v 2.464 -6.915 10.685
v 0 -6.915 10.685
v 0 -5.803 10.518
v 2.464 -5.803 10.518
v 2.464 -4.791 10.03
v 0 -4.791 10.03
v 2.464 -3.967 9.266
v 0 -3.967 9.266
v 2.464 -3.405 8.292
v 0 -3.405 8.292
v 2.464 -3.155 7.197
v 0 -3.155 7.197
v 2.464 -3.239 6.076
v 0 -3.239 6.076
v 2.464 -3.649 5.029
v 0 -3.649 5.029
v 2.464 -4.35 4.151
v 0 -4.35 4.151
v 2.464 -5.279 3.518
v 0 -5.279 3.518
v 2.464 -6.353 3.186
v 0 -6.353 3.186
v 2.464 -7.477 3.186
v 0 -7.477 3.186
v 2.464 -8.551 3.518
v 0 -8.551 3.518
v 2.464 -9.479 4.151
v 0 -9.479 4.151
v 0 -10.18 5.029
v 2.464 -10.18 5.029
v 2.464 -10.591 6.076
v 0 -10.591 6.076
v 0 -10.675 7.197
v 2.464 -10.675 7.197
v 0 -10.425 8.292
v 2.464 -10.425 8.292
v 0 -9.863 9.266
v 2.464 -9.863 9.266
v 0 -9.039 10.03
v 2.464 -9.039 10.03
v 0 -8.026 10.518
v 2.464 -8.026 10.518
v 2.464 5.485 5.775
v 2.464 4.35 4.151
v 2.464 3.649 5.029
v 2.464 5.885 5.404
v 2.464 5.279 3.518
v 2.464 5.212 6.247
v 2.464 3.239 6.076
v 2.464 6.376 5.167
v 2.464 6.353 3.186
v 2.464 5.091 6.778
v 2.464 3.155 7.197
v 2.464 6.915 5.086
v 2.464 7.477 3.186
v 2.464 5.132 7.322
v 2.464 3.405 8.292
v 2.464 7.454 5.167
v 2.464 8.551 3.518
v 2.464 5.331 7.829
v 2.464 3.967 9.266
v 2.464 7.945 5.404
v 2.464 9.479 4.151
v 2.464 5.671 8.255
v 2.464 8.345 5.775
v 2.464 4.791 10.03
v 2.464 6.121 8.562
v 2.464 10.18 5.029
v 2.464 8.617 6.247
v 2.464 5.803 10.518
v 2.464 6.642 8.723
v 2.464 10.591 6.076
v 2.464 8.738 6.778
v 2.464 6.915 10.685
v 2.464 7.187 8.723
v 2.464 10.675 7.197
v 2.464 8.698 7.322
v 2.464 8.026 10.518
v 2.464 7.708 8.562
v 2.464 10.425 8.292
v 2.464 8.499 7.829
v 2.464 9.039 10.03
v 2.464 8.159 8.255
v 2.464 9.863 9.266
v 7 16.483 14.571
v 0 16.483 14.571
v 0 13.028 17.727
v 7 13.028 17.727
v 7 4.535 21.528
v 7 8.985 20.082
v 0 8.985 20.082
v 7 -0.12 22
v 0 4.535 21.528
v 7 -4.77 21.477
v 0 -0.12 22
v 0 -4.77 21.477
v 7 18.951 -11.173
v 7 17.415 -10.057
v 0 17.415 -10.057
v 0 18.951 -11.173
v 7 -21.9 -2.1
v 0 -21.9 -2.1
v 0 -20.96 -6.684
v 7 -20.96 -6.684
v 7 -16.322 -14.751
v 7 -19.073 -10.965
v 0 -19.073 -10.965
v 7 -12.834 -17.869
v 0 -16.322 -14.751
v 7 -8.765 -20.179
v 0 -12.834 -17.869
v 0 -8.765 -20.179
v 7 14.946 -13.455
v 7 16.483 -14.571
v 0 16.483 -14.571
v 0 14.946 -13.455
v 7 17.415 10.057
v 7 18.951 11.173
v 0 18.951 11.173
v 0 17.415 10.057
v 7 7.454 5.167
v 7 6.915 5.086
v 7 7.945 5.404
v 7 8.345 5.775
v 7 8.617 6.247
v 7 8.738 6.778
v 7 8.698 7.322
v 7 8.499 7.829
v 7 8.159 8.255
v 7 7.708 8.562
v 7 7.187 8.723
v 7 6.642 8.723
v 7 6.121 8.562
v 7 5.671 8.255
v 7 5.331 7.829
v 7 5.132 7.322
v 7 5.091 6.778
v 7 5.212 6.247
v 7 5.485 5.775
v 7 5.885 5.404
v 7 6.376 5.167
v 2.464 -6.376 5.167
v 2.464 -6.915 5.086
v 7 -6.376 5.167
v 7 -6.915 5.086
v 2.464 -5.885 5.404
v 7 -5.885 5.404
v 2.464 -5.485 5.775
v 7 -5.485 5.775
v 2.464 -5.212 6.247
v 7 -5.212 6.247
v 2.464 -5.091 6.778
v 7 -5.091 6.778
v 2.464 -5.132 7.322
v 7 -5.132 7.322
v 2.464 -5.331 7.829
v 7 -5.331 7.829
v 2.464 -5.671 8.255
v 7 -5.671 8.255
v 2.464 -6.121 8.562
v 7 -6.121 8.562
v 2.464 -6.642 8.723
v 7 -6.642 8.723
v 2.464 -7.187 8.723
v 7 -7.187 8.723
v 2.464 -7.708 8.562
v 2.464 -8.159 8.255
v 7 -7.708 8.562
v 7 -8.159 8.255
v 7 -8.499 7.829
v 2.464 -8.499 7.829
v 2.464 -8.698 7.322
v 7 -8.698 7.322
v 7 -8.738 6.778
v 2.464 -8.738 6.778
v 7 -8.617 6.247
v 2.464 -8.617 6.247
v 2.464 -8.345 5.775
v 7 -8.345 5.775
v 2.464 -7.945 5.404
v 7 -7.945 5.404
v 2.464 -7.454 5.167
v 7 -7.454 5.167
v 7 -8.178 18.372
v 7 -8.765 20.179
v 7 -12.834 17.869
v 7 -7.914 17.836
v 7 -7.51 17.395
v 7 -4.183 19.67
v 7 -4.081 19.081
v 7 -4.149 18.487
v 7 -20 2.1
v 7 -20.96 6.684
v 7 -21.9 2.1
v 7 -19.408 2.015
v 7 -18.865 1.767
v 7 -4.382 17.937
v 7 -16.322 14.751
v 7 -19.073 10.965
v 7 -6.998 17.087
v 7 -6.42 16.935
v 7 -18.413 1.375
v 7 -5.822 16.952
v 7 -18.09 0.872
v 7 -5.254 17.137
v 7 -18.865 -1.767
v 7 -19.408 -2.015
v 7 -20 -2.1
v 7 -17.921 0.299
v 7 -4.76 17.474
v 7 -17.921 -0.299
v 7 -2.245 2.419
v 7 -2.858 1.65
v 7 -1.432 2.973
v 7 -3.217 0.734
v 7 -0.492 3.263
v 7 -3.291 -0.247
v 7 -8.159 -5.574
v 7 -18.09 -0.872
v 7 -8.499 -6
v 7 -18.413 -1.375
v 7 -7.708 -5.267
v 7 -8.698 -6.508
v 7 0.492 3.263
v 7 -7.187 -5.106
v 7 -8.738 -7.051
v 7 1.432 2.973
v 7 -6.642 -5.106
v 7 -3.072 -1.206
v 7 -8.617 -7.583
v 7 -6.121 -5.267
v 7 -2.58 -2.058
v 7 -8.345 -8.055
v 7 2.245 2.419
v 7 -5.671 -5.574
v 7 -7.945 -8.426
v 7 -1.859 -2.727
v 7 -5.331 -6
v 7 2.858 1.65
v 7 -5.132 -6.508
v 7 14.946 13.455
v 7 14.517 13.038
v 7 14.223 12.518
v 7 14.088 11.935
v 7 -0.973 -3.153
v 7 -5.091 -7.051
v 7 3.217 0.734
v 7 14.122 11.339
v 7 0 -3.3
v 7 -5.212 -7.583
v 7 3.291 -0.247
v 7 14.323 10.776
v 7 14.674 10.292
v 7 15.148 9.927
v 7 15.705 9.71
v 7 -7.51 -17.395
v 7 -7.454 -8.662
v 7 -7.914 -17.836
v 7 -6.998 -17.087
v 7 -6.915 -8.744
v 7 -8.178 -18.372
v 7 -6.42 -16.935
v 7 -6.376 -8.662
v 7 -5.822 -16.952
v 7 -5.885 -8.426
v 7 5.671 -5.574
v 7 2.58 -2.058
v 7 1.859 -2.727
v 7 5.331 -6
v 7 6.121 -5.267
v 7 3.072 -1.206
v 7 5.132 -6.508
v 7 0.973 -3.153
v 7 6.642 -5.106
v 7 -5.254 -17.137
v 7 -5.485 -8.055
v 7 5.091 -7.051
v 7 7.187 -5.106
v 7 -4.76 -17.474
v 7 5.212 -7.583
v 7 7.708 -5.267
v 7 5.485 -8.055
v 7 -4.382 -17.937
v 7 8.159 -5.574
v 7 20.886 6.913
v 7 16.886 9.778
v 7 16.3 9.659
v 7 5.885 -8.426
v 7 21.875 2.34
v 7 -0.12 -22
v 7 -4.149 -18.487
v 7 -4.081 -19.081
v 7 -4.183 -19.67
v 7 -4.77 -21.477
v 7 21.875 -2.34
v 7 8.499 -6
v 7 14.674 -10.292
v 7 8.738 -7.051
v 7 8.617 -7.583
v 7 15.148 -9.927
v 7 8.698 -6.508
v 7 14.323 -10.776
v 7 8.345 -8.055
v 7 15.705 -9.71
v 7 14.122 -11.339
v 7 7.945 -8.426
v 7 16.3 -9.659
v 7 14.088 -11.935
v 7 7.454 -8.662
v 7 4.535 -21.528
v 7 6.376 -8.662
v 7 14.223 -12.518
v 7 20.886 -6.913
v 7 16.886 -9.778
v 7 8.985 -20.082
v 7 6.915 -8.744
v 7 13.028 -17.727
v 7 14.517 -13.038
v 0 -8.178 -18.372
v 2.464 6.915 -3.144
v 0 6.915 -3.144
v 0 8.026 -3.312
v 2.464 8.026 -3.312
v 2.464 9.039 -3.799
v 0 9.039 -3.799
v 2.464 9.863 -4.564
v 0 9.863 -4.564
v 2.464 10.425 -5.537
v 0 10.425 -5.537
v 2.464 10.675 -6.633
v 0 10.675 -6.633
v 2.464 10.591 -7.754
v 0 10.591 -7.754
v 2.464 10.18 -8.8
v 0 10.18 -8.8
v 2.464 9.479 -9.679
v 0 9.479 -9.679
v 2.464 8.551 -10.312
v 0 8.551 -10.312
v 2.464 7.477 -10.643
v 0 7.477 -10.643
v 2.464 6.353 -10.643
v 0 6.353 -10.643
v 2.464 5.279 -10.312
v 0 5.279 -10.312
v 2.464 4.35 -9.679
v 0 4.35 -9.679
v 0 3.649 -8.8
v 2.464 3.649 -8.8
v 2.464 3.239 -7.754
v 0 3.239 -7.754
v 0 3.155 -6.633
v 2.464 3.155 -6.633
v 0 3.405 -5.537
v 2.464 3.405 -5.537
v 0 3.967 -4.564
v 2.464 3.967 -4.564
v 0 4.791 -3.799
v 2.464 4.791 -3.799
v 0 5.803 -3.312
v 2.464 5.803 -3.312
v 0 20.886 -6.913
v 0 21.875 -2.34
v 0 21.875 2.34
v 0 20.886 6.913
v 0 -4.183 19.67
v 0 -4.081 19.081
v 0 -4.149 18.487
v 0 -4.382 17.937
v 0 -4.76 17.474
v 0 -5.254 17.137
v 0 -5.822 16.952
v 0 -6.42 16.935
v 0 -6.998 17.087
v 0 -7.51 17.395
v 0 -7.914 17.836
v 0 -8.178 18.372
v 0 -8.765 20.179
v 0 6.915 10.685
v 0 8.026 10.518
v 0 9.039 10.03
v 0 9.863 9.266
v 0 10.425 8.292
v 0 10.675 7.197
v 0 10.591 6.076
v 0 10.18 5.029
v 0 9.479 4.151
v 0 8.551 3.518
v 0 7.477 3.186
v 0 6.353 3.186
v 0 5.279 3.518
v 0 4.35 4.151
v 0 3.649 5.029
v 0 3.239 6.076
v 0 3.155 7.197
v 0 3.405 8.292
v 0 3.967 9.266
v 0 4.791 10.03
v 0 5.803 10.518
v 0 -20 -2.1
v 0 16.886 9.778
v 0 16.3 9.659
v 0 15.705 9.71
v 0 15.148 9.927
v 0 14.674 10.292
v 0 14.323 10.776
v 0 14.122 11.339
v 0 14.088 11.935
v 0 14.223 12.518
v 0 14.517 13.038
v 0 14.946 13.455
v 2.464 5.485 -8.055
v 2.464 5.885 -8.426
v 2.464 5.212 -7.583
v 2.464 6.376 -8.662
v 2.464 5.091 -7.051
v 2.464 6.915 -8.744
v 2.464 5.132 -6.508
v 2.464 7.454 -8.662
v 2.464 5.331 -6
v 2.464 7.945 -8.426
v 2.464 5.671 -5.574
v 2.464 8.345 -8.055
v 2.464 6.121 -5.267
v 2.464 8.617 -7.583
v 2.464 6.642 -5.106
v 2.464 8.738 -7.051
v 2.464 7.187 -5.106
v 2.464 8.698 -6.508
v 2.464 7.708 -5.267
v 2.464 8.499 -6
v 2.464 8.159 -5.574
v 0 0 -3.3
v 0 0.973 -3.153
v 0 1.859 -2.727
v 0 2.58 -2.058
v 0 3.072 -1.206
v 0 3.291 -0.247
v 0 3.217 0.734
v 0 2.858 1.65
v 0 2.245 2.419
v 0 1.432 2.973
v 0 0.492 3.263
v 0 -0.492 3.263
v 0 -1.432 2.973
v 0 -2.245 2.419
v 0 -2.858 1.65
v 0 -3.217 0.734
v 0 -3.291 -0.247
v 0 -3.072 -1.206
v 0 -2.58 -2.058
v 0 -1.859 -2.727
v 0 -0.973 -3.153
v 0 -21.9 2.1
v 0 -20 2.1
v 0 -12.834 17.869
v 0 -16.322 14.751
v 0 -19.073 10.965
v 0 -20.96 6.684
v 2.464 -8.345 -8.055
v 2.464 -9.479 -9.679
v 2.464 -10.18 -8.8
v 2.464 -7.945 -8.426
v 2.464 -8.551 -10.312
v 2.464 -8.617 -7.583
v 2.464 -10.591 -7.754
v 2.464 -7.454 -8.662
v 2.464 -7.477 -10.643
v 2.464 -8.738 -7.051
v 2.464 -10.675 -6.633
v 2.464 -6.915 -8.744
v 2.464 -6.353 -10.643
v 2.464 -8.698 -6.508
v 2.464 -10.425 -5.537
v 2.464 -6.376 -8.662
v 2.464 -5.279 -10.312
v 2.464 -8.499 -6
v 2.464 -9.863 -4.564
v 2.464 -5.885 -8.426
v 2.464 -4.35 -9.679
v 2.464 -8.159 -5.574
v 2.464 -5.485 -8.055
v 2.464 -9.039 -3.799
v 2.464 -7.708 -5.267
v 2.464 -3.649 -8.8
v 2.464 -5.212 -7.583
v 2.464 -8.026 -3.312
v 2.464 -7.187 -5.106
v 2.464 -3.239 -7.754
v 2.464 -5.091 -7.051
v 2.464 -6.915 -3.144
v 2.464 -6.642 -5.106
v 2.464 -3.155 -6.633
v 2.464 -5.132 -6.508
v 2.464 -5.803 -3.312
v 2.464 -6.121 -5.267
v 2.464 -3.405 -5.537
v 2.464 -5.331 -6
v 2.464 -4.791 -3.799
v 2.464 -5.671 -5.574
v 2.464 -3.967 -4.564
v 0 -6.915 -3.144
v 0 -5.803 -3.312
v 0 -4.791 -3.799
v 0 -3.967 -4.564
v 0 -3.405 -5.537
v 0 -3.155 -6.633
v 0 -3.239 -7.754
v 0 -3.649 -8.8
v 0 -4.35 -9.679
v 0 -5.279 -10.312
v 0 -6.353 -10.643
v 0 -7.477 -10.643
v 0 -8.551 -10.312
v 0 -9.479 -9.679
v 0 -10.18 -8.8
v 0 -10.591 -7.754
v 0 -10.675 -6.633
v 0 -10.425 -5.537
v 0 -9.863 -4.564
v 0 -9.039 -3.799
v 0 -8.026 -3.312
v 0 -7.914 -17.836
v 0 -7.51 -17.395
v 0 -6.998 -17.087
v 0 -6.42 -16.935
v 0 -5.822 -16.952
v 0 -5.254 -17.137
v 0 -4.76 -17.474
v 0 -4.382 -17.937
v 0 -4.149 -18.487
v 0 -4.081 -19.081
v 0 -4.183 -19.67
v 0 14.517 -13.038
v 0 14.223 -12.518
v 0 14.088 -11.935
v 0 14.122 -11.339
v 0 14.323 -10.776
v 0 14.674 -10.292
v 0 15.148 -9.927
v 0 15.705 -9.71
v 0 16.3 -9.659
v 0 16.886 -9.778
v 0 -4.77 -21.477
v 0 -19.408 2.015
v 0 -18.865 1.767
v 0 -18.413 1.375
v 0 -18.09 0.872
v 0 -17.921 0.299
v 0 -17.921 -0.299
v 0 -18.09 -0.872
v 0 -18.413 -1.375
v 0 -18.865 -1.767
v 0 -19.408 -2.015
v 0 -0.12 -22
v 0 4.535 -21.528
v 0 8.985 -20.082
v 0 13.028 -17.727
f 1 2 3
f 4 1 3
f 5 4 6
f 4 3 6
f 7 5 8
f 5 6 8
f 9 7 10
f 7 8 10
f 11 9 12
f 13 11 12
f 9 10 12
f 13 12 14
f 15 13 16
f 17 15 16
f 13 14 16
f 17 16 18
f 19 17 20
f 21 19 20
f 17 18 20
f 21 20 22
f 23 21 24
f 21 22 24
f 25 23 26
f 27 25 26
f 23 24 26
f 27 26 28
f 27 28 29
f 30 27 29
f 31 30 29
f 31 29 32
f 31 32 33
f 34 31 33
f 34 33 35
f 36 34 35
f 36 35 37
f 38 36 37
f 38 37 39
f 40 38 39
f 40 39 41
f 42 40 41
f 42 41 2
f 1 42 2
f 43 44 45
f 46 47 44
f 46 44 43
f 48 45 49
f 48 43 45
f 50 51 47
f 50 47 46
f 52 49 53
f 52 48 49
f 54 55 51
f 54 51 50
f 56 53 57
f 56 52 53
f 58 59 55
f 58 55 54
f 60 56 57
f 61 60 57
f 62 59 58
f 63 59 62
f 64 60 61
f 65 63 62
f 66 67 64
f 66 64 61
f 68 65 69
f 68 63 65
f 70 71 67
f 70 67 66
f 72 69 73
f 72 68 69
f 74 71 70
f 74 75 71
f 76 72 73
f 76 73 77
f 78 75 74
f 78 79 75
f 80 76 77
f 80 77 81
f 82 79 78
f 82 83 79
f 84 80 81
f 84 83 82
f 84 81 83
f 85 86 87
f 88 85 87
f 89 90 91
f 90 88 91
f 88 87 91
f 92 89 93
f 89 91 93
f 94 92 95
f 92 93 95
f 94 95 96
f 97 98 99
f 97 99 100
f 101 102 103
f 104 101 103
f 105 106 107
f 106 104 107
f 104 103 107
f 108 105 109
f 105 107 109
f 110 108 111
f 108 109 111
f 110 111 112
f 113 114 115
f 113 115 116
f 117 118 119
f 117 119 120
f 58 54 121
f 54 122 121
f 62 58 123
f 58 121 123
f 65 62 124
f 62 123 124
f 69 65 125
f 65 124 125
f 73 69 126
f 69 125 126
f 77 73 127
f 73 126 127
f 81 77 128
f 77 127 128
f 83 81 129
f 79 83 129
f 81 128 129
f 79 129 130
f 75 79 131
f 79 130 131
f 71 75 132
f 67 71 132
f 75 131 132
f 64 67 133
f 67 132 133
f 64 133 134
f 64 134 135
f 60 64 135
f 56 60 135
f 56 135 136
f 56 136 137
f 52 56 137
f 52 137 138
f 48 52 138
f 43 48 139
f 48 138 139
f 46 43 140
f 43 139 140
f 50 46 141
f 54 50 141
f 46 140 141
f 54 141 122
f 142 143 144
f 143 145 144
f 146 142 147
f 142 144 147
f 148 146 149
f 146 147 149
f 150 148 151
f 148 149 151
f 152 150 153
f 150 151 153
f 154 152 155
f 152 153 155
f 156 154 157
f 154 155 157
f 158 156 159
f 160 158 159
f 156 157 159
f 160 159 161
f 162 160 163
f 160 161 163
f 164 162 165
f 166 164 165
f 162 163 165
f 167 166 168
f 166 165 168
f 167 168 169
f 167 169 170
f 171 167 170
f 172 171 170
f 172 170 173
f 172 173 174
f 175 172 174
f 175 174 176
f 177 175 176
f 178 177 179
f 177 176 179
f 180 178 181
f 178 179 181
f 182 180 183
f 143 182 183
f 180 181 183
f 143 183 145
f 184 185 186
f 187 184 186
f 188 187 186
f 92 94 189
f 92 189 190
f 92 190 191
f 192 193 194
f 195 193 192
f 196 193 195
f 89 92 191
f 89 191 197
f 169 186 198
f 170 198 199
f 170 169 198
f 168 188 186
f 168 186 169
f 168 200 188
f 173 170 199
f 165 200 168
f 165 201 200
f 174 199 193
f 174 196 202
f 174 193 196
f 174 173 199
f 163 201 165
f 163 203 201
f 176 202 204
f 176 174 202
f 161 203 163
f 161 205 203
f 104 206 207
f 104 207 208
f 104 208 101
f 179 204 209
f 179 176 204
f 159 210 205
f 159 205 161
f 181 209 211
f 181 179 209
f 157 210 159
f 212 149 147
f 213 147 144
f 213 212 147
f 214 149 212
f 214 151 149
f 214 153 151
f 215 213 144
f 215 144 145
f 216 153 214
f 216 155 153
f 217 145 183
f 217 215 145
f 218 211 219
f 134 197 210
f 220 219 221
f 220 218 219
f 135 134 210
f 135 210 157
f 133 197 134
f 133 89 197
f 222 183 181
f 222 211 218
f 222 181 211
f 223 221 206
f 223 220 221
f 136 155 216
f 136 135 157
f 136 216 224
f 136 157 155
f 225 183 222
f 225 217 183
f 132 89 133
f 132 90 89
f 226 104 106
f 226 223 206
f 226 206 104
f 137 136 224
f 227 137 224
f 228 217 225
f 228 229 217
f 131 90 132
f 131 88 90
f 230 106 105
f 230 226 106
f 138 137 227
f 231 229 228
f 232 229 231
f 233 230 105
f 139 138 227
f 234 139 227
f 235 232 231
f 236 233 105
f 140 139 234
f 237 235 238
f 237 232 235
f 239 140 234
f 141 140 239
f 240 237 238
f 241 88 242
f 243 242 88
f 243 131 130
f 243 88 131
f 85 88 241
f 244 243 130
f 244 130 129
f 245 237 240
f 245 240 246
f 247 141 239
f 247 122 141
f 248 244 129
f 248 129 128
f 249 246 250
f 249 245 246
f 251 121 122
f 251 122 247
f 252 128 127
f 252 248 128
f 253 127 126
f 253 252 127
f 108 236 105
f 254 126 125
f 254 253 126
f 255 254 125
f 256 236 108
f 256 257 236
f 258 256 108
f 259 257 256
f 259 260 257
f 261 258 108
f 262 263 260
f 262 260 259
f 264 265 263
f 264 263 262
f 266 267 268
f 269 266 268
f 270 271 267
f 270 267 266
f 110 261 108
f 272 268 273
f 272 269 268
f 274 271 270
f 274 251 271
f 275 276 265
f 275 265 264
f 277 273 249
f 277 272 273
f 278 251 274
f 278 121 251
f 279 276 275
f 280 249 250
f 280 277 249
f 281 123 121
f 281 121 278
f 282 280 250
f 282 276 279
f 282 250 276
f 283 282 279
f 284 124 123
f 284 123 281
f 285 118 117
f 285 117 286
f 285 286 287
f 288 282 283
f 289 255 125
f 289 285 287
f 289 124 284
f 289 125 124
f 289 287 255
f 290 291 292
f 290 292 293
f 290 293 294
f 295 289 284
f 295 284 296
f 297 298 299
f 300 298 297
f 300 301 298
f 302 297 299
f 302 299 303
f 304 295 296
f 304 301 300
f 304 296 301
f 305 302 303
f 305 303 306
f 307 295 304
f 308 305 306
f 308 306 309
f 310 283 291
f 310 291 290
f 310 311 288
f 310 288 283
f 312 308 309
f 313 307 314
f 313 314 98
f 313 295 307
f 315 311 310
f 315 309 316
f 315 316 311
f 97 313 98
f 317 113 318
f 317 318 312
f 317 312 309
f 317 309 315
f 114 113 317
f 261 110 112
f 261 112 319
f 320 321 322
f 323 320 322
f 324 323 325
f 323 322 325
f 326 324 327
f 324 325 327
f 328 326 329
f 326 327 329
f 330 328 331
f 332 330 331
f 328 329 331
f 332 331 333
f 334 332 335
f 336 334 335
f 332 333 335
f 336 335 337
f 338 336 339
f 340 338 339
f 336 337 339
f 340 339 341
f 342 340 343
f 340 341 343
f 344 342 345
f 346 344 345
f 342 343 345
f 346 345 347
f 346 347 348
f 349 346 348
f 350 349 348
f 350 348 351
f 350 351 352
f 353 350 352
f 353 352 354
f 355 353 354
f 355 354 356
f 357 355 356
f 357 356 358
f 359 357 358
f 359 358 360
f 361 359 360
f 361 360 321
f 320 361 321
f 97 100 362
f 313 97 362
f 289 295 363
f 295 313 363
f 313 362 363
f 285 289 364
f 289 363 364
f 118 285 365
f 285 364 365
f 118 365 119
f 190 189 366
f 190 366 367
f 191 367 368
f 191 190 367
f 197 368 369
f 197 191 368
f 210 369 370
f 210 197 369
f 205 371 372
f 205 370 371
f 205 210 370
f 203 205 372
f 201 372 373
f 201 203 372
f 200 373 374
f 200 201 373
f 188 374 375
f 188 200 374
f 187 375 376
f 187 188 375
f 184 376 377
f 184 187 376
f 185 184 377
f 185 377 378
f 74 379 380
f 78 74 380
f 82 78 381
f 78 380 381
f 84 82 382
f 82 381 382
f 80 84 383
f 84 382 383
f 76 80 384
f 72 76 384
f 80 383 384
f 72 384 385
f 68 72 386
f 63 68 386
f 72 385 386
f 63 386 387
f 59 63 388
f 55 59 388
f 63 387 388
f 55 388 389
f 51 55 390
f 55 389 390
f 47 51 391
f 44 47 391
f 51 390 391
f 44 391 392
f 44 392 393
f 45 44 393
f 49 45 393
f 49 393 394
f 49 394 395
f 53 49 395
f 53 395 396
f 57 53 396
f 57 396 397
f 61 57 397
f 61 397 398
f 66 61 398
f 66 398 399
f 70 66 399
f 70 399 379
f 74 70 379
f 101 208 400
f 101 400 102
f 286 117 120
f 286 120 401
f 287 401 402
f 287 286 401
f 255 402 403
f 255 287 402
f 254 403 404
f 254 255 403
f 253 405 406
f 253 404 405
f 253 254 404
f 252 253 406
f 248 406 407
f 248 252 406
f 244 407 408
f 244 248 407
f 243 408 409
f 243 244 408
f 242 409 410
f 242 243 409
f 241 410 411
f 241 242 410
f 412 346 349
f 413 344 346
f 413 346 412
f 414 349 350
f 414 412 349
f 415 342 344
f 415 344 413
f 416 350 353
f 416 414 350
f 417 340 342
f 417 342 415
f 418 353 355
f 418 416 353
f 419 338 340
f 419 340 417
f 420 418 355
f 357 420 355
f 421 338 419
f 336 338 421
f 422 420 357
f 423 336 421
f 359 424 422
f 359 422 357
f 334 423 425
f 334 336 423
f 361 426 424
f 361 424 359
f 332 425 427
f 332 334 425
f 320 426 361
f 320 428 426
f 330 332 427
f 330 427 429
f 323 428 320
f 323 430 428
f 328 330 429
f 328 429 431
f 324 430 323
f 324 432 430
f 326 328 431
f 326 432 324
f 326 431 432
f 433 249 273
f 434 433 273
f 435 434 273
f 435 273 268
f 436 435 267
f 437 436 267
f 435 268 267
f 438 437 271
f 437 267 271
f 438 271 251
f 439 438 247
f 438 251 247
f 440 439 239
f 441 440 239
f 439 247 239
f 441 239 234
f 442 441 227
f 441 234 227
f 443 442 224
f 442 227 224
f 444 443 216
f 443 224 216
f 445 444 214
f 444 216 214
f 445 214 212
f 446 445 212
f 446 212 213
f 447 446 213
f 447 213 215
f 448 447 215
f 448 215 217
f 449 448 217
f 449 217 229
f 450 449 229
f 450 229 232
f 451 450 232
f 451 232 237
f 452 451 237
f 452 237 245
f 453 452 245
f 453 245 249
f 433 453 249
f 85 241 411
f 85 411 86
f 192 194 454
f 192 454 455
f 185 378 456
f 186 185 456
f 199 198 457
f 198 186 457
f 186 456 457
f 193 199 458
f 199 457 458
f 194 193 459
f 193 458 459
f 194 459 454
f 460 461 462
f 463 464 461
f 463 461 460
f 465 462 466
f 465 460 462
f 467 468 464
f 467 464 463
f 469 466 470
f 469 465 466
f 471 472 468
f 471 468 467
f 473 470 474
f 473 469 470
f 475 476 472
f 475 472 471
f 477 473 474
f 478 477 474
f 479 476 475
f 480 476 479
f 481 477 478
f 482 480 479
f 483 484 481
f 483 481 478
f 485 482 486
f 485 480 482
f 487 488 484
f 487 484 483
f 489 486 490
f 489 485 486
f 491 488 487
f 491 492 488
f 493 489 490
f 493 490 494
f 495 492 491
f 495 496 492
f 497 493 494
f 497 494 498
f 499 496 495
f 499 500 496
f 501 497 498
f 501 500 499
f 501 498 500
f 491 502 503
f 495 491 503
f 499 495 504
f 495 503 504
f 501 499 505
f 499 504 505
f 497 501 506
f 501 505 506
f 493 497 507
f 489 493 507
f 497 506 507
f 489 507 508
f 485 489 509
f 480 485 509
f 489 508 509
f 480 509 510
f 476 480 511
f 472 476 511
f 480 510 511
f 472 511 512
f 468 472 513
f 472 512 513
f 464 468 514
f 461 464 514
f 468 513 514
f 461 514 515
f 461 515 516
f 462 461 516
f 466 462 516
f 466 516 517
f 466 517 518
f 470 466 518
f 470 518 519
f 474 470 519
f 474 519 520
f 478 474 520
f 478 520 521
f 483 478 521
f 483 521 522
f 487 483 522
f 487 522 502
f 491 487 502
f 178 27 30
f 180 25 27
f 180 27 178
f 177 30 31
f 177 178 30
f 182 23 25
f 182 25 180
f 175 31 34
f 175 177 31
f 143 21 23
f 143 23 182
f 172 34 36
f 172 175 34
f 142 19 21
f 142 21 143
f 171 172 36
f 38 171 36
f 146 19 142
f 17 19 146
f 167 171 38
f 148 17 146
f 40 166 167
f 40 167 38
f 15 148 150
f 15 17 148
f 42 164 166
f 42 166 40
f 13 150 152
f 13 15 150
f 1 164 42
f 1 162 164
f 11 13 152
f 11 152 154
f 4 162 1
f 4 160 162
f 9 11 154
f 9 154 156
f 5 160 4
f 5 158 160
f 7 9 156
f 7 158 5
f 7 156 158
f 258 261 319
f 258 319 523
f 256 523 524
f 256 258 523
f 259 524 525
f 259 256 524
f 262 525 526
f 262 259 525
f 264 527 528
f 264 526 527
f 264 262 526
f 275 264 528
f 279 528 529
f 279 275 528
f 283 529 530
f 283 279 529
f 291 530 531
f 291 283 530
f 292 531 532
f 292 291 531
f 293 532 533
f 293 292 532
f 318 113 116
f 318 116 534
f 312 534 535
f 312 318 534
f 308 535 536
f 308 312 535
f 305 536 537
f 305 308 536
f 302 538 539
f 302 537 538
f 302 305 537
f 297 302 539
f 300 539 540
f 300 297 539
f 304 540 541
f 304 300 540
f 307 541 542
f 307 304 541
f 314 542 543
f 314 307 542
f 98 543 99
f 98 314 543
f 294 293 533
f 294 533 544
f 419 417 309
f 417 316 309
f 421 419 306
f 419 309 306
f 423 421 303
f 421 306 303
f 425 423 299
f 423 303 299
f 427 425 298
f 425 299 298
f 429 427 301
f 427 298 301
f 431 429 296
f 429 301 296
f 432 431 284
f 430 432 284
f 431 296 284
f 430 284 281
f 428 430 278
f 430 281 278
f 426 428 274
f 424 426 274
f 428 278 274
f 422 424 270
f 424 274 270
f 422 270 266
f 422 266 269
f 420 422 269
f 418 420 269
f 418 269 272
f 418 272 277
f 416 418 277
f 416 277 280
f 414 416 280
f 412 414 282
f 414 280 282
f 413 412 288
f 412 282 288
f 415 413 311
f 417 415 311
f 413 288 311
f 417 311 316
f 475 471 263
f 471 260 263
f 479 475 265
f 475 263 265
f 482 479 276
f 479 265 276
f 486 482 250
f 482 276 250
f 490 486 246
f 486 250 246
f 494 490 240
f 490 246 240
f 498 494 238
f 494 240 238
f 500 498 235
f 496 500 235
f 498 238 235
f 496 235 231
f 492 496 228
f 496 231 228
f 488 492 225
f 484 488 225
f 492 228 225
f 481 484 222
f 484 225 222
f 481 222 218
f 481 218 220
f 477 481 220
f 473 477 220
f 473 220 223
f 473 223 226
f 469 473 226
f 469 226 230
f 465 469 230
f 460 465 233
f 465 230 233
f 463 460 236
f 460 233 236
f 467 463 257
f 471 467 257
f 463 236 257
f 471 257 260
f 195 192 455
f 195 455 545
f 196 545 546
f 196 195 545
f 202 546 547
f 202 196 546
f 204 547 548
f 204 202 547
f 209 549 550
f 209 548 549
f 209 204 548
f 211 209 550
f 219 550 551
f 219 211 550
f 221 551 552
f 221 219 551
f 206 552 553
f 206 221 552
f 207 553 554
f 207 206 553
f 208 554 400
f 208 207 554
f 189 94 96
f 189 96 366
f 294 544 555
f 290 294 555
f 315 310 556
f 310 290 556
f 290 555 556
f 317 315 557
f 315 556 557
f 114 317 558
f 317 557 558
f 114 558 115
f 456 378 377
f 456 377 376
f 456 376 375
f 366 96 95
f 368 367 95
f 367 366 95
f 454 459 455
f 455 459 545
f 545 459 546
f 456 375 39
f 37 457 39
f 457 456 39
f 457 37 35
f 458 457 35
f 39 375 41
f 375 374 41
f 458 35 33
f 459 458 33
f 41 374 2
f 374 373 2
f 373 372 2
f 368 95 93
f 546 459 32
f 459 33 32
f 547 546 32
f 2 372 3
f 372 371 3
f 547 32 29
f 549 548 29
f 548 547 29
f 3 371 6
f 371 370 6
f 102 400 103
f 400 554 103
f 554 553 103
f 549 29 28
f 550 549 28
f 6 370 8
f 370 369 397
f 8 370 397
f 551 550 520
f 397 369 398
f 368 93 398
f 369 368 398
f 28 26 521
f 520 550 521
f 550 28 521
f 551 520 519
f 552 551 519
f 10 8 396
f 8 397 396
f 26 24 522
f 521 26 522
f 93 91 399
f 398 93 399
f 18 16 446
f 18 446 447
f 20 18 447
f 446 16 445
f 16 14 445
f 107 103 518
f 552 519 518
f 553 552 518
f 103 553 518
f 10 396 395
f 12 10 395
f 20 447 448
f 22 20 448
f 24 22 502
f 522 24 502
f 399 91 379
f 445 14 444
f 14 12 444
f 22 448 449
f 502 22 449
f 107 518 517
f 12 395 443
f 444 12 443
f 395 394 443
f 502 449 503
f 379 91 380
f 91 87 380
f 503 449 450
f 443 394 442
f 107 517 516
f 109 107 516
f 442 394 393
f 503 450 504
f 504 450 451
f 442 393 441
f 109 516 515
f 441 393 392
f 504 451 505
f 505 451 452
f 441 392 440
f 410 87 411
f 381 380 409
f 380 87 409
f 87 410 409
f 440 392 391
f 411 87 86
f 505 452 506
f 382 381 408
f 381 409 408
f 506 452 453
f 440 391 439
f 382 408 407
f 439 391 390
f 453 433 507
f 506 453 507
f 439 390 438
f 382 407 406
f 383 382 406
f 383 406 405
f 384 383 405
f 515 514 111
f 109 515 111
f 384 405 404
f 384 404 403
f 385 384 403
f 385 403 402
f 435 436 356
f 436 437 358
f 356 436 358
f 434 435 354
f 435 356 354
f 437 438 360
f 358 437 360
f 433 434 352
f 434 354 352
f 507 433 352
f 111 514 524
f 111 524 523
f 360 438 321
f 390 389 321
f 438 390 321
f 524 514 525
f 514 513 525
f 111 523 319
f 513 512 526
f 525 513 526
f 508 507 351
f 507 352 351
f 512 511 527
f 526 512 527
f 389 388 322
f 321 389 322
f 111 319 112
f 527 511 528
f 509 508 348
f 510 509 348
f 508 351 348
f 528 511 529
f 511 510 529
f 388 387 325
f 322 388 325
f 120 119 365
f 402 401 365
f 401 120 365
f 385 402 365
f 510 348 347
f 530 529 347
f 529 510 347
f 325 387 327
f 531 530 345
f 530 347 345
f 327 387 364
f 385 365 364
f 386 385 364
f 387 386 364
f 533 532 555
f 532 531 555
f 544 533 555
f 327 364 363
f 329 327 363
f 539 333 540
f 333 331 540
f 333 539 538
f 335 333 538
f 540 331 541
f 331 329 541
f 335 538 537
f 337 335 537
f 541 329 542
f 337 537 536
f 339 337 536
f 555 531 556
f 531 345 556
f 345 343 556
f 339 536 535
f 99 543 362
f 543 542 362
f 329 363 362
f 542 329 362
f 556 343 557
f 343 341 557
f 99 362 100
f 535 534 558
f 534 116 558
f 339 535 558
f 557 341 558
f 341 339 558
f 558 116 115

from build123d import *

# Parameters (mm, degrees)
ESQUISSE1_R                                      = 22
BOSS_EXTRU_1_DEPTH                               = 7
ENL_V_MAT_EXTRU_1_REACH                          = 33.89
R_P_TITION_CIRCULAIRE1_COUNT                     = 5
ENL_V_MAT_EXTRU_2_REACH                          = 33.89
ESQUISSE6_R                                      = 3.3
CHAMBRAGE_POUR_VIS_T_TE_RONDE_BOMB_E_D           = 3.6576
CHAMBRAGE_POUR_VIS_T_TE_RONDE_BOMB_E_CBORE_D     = 7.54126
CHAMBRAGE_POUR_VIS_T_TE_RONDE_BOMB_E_CBORE_DEPTH = 2.4638


with BuildPart() as part:
    # Esquisse1 → Boss.-Extru.1 (new body)
    with BuildSketch(Plane(origin=(0, 0, 0), x_dir=(0, 0, -1), z_dir=(1, 0, 0))):
        Circle(ESQUISSE1_R)
    extrude(amount=BOSS_EXTRU_1_DEPTH)

    # Esquisse5 → Enlèv. mat.-Extru.1 (cut, up to next)
    with BuildSketch(Plane(origin=(7, 0, 0), x_dir=(0, 0, -1), z_dir=(1, 0, 0)), mode=Mode.PRIVATE) as enl_v_mat_extru_1_sk1:
        with BuildLine():
            Line((2.1, -20), (2.1, -24))
            ThreePointArc((2.1, -24), (0, -26.1), (-2.1, -24))
            Line((-2.1, -24), (-2.1, -20))
            ThreePointArc((-2.1, -20), (0, -17.9), (2.1, -20))
        make_face()
    enl_v_mat_extru_1_tool1 = extrude(enl_v_mat_extru_1_sk1.sketch, amount=-ENL_V_MAT_EXTRU_1_REACH, mode=Mode.PRIVATE) & part.part
    enl_v_mat_extru_1 = enl_v_mat_extru_1_tool1.solids().sort_by_distance((7, -22, 0))[0]
    add(enl_v_mat_extru_1, mode=Mode.SUBTRACT)

    # Répétition circulaire1: Enlèv. mat.-Extru.1 ×5 about axis
    r_p_tition_circulaire1_axis = Axis((0, 0, 0), (1, 0, 0))
    for i in range(1, R_P_TITION_CIRCULAIRE1_COUNT):
        add(enl_v_mat_extru_1.rotate(r_p_tition_circulaire1_axis, i * 360 / R_P_TITION_CIRCULAIRE1_COUNT), mode=Mode.SUBTRACT)

    # Esquisse6 → Enlèv. mat.-Extru.2 (cut, up to next)
    with BuildSketch(Plane(origin=(7, 0, 0), x_dir=(0, 0, -1), z_dir=(1, 0, 0)), mode=Mode.PRIVATE) as enl_v_mat_extru_2_sk1:
        Circle(ESQUISSE6_R)
    enl_v_mat_extru_2_tool1 = extrude(enl_v_mat_extru_2_sk1.sketch, amount=-ENL_V_MAT_EXTRU_2_REACH, mode=Mode.PRIVATE) & part.part
    add(enl_v_mat_extru_2_tool1.solids().sort_by_distance((7, 0, 0))[0], mode=Mode.SUBTRACT)

    # Chambrage pour vis à tête ronde bombée #61 (through all)
    with Locations(Plane.ZY):
        with Locations((-6.914797213, 6.914797213), (6.914797213, 6.914797213), (6.914797213, -6.914797213), (-6.914797213, -6.914797213)):
            CounterBoreHole(CHAMBRAGE_POUR_VIS_T_TE_RONDE_BOMB_E_D / 2, CHAMBRAGE_POUR_VIS_T_TE_RONDE_BOMB_E_CBORE_D / 2, CHAMBRAGE_POUR_VIS_T_TE_RONDE_BOMB_E_CBORE_DEPTH)


solid = part.part
